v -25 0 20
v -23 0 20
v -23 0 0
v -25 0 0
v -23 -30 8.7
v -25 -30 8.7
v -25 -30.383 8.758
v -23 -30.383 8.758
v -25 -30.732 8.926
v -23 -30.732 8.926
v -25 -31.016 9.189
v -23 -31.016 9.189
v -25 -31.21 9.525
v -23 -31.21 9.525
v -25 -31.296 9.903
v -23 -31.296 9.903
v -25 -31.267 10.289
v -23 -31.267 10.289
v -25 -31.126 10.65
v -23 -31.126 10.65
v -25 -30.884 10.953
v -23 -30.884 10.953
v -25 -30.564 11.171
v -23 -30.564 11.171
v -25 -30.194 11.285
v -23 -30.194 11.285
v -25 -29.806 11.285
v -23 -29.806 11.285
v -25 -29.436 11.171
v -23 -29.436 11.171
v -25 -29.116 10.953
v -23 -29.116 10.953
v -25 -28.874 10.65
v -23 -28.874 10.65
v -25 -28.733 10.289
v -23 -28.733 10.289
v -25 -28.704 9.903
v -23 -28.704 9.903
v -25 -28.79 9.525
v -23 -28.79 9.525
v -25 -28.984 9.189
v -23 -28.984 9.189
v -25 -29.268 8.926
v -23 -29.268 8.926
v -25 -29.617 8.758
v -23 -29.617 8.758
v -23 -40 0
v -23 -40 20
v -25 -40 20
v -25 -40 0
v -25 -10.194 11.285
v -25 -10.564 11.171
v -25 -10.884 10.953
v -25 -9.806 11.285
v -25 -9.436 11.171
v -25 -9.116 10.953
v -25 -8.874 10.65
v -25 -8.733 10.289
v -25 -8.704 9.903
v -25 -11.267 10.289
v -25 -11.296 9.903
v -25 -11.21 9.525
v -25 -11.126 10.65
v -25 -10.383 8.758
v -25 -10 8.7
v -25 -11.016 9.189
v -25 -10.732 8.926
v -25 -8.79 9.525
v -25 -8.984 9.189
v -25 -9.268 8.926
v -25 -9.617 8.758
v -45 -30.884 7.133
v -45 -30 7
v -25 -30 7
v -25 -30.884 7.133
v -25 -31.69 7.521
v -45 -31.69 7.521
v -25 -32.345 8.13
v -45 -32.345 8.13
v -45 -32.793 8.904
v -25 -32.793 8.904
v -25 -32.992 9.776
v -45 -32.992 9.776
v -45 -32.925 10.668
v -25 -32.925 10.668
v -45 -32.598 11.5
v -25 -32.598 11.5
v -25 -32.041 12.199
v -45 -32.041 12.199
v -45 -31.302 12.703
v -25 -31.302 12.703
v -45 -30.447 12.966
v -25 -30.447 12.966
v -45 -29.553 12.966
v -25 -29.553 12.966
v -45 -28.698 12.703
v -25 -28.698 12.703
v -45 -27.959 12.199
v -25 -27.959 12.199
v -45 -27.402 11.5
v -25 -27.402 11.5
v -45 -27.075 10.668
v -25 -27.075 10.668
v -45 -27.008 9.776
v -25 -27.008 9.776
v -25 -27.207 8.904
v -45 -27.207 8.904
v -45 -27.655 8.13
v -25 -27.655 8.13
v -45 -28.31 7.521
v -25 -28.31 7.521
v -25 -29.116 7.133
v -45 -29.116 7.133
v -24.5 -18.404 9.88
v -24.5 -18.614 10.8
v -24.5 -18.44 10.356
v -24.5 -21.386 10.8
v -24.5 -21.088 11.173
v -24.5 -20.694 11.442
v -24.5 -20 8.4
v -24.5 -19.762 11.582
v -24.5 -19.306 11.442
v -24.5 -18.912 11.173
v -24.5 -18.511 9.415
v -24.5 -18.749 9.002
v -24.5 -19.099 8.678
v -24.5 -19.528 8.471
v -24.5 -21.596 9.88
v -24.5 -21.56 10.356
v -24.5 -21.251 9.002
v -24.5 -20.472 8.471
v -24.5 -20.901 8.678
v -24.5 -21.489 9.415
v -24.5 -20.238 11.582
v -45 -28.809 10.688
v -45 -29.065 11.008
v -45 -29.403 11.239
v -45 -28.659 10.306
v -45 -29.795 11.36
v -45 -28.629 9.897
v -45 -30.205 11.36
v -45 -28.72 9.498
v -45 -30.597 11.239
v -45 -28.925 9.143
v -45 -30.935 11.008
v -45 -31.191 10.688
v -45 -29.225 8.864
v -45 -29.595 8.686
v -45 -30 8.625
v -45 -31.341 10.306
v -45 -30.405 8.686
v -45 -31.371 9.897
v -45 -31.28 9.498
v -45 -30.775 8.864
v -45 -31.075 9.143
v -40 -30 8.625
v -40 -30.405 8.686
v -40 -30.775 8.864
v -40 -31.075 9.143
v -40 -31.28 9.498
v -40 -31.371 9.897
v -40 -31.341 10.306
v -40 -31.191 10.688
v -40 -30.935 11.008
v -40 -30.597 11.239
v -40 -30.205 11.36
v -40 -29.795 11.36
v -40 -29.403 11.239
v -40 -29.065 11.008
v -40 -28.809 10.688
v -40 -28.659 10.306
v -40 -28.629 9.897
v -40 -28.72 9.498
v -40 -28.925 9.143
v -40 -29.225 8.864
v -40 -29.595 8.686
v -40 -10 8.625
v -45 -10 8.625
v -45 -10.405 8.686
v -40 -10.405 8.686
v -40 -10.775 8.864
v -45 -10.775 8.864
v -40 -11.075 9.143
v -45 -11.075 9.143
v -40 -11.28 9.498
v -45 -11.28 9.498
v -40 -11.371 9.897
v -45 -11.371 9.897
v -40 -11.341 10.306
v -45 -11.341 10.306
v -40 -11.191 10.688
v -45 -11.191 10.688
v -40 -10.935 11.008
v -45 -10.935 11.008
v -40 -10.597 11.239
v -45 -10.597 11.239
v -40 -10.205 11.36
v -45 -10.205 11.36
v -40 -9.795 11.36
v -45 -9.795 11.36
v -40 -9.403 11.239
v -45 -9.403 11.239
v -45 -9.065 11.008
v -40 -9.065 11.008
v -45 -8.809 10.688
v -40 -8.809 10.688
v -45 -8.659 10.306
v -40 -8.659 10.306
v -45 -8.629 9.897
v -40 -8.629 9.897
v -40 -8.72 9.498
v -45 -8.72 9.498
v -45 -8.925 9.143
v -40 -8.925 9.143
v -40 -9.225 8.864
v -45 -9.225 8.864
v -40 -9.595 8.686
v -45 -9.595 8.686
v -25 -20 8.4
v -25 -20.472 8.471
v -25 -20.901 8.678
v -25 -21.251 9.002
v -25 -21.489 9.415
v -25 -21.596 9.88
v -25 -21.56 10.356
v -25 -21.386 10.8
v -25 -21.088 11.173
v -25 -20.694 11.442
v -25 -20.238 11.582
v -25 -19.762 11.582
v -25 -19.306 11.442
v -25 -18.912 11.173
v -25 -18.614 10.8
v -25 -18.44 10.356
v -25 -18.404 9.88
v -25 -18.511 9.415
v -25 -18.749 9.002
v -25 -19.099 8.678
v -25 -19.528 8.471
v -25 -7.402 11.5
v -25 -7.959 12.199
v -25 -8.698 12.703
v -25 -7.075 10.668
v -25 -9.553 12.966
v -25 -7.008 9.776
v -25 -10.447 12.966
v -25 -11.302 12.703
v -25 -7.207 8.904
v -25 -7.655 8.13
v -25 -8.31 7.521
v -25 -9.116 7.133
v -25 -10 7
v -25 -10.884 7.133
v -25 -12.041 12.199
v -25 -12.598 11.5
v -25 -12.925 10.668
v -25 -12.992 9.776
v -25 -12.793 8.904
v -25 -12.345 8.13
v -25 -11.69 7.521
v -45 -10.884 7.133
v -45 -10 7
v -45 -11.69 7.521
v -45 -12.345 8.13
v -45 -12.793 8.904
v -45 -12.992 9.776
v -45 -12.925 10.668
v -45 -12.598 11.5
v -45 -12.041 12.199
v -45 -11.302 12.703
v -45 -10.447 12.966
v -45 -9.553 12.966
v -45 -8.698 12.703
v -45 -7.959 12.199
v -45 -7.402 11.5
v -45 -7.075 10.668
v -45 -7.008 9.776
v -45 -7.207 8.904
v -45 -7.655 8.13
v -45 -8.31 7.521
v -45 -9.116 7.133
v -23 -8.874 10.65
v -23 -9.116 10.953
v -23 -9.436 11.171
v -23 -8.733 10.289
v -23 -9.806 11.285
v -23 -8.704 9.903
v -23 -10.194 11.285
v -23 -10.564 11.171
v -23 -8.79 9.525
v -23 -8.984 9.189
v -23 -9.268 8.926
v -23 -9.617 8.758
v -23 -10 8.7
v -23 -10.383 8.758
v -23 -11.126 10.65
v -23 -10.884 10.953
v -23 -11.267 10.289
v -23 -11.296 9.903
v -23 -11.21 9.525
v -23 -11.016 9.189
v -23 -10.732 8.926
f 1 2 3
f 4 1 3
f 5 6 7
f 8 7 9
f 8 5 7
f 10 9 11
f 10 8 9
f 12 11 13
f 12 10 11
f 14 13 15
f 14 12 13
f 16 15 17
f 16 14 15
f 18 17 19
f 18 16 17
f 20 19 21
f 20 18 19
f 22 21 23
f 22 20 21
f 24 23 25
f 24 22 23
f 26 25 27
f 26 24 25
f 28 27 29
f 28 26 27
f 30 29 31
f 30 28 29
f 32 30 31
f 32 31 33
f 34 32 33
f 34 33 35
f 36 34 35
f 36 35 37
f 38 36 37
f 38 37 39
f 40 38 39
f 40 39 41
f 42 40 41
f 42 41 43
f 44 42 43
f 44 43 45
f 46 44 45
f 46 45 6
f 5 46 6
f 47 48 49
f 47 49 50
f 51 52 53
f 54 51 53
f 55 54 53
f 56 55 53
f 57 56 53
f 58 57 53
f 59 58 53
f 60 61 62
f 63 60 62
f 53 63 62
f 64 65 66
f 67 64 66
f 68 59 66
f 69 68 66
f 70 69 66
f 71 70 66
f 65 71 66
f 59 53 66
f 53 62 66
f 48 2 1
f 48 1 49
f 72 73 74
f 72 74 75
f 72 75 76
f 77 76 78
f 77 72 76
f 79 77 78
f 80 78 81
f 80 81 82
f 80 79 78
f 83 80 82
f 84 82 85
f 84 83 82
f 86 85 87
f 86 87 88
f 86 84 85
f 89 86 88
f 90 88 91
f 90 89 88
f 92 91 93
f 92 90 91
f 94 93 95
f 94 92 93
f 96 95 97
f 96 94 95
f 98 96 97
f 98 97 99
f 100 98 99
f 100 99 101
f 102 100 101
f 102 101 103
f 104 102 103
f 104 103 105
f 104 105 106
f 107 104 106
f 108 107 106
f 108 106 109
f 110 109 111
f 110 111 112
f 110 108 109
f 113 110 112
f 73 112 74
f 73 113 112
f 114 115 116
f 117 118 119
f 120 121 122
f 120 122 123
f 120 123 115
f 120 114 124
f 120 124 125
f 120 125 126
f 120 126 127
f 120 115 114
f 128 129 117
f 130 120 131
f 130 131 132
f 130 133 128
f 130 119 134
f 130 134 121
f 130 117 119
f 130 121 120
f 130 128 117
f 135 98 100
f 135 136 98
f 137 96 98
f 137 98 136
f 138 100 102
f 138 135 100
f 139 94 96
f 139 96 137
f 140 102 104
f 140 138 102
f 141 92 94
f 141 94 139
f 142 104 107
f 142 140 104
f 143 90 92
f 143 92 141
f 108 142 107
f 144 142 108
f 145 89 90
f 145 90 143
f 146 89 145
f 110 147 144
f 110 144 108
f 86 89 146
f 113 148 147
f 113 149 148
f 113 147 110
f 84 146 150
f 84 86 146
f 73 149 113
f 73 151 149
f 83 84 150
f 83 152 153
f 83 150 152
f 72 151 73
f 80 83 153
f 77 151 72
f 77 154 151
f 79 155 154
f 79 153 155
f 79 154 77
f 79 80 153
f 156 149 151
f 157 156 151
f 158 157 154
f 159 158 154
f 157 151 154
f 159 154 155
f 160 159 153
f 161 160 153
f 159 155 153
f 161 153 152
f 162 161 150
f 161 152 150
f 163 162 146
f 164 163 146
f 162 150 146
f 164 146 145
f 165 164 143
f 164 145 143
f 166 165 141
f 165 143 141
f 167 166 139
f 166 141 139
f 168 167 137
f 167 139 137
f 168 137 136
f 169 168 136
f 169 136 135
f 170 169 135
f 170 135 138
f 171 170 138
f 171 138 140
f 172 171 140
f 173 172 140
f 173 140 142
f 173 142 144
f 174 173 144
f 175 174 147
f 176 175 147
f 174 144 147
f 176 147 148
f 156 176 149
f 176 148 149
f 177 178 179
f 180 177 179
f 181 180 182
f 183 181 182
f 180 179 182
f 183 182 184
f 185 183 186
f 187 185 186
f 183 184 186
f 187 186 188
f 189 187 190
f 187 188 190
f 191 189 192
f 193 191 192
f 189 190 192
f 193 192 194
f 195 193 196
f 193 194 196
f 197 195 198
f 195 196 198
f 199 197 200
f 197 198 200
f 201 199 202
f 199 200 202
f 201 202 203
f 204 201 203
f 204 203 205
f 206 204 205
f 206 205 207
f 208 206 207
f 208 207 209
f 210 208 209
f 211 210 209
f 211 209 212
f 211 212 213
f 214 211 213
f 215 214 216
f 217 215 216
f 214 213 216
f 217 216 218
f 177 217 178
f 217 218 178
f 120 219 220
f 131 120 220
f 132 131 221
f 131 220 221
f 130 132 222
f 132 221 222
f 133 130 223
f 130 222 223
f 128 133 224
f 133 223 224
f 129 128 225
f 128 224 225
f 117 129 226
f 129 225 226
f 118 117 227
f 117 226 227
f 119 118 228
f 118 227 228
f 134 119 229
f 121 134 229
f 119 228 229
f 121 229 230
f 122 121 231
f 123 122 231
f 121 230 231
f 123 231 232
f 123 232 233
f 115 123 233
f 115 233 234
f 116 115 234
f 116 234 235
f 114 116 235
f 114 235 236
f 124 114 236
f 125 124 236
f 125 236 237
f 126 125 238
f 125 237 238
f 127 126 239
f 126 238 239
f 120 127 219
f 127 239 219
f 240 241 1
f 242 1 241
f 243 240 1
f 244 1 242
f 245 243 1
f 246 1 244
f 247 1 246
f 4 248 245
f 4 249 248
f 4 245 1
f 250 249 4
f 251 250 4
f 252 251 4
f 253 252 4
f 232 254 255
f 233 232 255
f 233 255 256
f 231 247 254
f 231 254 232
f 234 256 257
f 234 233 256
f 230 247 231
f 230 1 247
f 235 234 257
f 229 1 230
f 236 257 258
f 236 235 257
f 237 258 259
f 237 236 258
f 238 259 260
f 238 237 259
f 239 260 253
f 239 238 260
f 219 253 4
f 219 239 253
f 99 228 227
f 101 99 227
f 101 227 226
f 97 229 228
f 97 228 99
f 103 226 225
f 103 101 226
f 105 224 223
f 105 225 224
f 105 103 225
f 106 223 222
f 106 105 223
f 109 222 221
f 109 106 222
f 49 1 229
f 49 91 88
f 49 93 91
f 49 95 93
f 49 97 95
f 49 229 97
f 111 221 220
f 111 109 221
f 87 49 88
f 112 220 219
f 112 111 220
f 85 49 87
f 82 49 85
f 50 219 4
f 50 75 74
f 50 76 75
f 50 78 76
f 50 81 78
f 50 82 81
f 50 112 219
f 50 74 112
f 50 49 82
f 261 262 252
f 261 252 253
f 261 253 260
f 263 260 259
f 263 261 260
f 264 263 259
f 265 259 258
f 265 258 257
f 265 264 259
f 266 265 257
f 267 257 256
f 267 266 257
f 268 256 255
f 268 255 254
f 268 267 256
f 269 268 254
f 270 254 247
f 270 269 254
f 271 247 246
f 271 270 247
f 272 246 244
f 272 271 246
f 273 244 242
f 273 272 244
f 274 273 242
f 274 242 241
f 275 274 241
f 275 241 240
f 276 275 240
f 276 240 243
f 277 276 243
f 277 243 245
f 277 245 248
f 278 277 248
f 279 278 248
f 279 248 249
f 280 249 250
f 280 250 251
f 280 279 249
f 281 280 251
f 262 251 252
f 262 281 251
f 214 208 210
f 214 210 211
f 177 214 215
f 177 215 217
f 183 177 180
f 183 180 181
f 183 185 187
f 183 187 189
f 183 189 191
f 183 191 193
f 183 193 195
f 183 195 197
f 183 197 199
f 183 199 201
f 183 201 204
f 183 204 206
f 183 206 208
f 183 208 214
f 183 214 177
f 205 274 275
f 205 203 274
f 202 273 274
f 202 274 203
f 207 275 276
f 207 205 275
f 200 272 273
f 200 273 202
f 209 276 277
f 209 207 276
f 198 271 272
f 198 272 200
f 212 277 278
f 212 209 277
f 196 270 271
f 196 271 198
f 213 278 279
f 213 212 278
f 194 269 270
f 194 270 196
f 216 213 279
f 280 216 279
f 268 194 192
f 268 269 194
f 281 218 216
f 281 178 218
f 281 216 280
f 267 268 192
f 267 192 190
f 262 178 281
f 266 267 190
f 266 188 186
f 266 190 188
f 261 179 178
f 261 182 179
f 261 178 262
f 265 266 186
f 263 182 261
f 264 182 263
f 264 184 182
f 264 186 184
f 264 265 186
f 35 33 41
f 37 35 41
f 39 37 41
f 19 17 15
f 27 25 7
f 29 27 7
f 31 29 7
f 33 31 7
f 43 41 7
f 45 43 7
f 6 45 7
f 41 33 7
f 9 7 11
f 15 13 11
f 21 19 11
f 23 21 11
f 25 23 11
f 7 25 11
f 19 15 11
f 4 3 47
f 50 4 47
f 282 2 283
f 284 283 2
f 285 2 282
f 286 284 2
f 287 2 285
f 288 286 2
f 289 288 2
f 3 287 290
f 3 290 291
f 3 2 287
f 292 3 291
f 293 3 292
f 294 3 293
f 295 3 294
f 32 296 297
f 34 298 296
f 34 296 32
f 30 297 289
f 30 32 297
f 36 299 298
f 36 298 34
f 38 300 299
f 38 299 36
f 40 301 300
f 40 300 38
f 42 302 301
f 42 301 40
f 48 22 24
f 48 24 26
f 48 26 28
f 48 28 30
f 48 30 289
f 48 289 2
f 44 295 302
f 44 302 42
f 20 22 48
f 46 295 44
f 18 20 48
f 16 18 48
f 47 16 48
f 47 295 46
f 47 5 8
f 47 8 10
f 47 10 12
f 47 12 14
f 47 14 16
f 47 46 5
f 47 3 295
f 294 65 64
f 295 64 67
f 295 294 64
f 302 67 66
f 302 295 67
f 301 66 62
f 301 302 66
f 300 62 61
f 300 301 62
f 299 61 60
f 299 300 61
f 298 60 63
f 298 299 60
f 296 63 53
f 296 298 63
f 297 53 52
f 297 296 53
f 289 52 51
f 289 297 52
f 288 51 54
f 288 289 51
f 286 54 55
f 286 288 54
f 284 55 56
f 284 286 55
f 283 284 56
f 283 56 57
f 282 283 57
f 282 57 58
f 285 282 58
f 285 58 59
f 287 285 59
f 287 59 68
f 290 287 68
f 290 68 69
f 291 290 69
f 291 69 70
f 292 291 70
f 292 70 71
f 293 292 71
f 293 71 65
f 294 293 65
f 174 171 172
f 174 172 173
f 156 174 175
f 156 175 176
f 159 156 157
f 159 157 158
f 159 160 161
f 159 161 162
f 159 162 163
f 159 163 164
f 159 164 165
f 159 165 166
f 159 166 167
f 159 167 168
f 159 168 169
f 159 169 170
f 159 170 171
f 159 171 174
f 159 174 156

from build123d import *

# Parameters (mm, degrees)
SKETCH005_W       = 20
SKETCH005_H       = 40
SKETCH005_R       = 1.3
PAD002_DEPTH      = 5
SKETCH006_R       = 2.5
PAD003_DEPTH      = 20
SKETCH007_R       = 1.6
POCKET003_DEPTH   = 0.5
POCKET003_FACE4_W = 40
POCKET003_FACE4_H = 20
POCKET003_FACE4_R = 1.3
POCKET006_DEPTH   = 3
SKETCH014_R       = 1.3
POCKET009_DEPTH   = 5
SKETCH016_R       = 3
SKETCH016_R_2     = 2.5
PAD008_DEPTH      = 20
SKETCH017_R       = 1.375
POCKET010_DEPTH   = 5


with BuildPart() as part:
    # Sketch005 (on DatumPlane) → Pad002 (new body)
    with BuildSketch(Plane(origin=(0, 0, 20), x_dir=(0, 0, -1), z_dir=(-1, 0, 0))):
        with Locations((10, 20)):
            Rectangle(SKETCH005_W, SKETCH005_H)
        with Locations((10, 30)):
            Circle(SKETCH005_R, mode=Mode.SUBTRACT)
        with Locations((10, 10)):
            Circle(SKETCH005_R, mode=Mode.SUBTRACT)
    extrude(amount=PAD002_DEPTH)

    # Sketch006 (on Face8 of Pad002) → Pad003 (join)
    with BuildSketch(Plane(origin=(-5, 0, 20), x_dir=(0, 0, -1), z_dir=(-1, 0, 0))):
        with Locations((10, 30)):
            Circle(SKETCH006_R)
        with Locations((10, 10)):
            Circle(SKETCH006_R)
    extrude(amount=PAD003_DEPTH)

    # Sketch007 → Pocket003 (cut)
    with BuildSketch(Plane(origin=(-5, 0, 20), x_dir=(0, 0, -1), z_dir=(-1, 0, 0))):
        with Locations((10, 20)):
            Circle(SKETCH007_R)
    extrude(amount=-POCKET003_DEPTH, mode=Mode.SUBTRACT)

    # Pocket003 Face4 → Pocket006 (cut)
    with BuildSketch(Plane(origin=(0, -20, 10), x_dir=(0, -1, 0), z_dir=(1, 0, 0))):
        Rectangle(POCKET003_FACE4_W, POCKET003_FACE4_H)
        with Locations((10, 0)):
            Circle(POCKET003_FACE4_R, mode=Mode.SUBTRACT)
        with Locations((-10, 0)):
            Circle(POCKET003_FACE4_R, mode=Mode.SUBTRACT)
    extrude(amount=-POCKET006_DEPTH, mode=Mode.SUBTRACT)

    # Sketch014 (on Face14 of Pocket006) → Pocket009 (cut)
    with BuildSketch(Plane(origin=(-25, 0, 20), x_dir=(0, 0, -1), z_dir=(-1, 0, 0))):
        with Locations((10, 10)):
            Circle(SKETCH014_R)
        with Locations((10, 30)):
            Circle(SKETCH014_R)
    extrude(amount=-POCKET009_DEPTH, mode=Mode.SUBTRACT)

    # Sketch016 (on Face14 of Pocket009) → Pad008 (join)
    with BuildSketch(Plane(origin=(-25, 0, 20), x_dir=(0, 0, -1), z_dir=(-1, 0, 0))):
        with Locations((10, 30)):
            Circle(SKETCH016_R)
        with Locations((10, 30)):
            Circle(SKETCH016_R_2, mode=Mode.SUBTRACT)
        with Locations((10, 10)):
            Circle(SKETCH016_R)
        with Locations((10, 10)):
            Circle(SKETCH016_R_2, mode=Mode.SUBTRACT)
    extrude(amount=-PAD008_DEPTH)

    # Sketch017 (on Face15 of Pad008) → Pocket010 (cut)
    with BuildSketch(Plane(origin=(-25, 0, 20), x_dir=(0, 0, -1), z_dir=(-1, 0, 0))):
        with Locations((10, 30)):
            Circle(SKETCH017_R)
        with Locations((10, 10)):
            Circle(SKETCH017_R)
    extrude(amount=-POCKET010_DEPTH, mode=Mode.SUBTRACT)


with BuildPart() as part_1:
    # Body002 placement: moved
    add(part.part.moved(Location((-20, 0, 0))))


solid = part_1.part
